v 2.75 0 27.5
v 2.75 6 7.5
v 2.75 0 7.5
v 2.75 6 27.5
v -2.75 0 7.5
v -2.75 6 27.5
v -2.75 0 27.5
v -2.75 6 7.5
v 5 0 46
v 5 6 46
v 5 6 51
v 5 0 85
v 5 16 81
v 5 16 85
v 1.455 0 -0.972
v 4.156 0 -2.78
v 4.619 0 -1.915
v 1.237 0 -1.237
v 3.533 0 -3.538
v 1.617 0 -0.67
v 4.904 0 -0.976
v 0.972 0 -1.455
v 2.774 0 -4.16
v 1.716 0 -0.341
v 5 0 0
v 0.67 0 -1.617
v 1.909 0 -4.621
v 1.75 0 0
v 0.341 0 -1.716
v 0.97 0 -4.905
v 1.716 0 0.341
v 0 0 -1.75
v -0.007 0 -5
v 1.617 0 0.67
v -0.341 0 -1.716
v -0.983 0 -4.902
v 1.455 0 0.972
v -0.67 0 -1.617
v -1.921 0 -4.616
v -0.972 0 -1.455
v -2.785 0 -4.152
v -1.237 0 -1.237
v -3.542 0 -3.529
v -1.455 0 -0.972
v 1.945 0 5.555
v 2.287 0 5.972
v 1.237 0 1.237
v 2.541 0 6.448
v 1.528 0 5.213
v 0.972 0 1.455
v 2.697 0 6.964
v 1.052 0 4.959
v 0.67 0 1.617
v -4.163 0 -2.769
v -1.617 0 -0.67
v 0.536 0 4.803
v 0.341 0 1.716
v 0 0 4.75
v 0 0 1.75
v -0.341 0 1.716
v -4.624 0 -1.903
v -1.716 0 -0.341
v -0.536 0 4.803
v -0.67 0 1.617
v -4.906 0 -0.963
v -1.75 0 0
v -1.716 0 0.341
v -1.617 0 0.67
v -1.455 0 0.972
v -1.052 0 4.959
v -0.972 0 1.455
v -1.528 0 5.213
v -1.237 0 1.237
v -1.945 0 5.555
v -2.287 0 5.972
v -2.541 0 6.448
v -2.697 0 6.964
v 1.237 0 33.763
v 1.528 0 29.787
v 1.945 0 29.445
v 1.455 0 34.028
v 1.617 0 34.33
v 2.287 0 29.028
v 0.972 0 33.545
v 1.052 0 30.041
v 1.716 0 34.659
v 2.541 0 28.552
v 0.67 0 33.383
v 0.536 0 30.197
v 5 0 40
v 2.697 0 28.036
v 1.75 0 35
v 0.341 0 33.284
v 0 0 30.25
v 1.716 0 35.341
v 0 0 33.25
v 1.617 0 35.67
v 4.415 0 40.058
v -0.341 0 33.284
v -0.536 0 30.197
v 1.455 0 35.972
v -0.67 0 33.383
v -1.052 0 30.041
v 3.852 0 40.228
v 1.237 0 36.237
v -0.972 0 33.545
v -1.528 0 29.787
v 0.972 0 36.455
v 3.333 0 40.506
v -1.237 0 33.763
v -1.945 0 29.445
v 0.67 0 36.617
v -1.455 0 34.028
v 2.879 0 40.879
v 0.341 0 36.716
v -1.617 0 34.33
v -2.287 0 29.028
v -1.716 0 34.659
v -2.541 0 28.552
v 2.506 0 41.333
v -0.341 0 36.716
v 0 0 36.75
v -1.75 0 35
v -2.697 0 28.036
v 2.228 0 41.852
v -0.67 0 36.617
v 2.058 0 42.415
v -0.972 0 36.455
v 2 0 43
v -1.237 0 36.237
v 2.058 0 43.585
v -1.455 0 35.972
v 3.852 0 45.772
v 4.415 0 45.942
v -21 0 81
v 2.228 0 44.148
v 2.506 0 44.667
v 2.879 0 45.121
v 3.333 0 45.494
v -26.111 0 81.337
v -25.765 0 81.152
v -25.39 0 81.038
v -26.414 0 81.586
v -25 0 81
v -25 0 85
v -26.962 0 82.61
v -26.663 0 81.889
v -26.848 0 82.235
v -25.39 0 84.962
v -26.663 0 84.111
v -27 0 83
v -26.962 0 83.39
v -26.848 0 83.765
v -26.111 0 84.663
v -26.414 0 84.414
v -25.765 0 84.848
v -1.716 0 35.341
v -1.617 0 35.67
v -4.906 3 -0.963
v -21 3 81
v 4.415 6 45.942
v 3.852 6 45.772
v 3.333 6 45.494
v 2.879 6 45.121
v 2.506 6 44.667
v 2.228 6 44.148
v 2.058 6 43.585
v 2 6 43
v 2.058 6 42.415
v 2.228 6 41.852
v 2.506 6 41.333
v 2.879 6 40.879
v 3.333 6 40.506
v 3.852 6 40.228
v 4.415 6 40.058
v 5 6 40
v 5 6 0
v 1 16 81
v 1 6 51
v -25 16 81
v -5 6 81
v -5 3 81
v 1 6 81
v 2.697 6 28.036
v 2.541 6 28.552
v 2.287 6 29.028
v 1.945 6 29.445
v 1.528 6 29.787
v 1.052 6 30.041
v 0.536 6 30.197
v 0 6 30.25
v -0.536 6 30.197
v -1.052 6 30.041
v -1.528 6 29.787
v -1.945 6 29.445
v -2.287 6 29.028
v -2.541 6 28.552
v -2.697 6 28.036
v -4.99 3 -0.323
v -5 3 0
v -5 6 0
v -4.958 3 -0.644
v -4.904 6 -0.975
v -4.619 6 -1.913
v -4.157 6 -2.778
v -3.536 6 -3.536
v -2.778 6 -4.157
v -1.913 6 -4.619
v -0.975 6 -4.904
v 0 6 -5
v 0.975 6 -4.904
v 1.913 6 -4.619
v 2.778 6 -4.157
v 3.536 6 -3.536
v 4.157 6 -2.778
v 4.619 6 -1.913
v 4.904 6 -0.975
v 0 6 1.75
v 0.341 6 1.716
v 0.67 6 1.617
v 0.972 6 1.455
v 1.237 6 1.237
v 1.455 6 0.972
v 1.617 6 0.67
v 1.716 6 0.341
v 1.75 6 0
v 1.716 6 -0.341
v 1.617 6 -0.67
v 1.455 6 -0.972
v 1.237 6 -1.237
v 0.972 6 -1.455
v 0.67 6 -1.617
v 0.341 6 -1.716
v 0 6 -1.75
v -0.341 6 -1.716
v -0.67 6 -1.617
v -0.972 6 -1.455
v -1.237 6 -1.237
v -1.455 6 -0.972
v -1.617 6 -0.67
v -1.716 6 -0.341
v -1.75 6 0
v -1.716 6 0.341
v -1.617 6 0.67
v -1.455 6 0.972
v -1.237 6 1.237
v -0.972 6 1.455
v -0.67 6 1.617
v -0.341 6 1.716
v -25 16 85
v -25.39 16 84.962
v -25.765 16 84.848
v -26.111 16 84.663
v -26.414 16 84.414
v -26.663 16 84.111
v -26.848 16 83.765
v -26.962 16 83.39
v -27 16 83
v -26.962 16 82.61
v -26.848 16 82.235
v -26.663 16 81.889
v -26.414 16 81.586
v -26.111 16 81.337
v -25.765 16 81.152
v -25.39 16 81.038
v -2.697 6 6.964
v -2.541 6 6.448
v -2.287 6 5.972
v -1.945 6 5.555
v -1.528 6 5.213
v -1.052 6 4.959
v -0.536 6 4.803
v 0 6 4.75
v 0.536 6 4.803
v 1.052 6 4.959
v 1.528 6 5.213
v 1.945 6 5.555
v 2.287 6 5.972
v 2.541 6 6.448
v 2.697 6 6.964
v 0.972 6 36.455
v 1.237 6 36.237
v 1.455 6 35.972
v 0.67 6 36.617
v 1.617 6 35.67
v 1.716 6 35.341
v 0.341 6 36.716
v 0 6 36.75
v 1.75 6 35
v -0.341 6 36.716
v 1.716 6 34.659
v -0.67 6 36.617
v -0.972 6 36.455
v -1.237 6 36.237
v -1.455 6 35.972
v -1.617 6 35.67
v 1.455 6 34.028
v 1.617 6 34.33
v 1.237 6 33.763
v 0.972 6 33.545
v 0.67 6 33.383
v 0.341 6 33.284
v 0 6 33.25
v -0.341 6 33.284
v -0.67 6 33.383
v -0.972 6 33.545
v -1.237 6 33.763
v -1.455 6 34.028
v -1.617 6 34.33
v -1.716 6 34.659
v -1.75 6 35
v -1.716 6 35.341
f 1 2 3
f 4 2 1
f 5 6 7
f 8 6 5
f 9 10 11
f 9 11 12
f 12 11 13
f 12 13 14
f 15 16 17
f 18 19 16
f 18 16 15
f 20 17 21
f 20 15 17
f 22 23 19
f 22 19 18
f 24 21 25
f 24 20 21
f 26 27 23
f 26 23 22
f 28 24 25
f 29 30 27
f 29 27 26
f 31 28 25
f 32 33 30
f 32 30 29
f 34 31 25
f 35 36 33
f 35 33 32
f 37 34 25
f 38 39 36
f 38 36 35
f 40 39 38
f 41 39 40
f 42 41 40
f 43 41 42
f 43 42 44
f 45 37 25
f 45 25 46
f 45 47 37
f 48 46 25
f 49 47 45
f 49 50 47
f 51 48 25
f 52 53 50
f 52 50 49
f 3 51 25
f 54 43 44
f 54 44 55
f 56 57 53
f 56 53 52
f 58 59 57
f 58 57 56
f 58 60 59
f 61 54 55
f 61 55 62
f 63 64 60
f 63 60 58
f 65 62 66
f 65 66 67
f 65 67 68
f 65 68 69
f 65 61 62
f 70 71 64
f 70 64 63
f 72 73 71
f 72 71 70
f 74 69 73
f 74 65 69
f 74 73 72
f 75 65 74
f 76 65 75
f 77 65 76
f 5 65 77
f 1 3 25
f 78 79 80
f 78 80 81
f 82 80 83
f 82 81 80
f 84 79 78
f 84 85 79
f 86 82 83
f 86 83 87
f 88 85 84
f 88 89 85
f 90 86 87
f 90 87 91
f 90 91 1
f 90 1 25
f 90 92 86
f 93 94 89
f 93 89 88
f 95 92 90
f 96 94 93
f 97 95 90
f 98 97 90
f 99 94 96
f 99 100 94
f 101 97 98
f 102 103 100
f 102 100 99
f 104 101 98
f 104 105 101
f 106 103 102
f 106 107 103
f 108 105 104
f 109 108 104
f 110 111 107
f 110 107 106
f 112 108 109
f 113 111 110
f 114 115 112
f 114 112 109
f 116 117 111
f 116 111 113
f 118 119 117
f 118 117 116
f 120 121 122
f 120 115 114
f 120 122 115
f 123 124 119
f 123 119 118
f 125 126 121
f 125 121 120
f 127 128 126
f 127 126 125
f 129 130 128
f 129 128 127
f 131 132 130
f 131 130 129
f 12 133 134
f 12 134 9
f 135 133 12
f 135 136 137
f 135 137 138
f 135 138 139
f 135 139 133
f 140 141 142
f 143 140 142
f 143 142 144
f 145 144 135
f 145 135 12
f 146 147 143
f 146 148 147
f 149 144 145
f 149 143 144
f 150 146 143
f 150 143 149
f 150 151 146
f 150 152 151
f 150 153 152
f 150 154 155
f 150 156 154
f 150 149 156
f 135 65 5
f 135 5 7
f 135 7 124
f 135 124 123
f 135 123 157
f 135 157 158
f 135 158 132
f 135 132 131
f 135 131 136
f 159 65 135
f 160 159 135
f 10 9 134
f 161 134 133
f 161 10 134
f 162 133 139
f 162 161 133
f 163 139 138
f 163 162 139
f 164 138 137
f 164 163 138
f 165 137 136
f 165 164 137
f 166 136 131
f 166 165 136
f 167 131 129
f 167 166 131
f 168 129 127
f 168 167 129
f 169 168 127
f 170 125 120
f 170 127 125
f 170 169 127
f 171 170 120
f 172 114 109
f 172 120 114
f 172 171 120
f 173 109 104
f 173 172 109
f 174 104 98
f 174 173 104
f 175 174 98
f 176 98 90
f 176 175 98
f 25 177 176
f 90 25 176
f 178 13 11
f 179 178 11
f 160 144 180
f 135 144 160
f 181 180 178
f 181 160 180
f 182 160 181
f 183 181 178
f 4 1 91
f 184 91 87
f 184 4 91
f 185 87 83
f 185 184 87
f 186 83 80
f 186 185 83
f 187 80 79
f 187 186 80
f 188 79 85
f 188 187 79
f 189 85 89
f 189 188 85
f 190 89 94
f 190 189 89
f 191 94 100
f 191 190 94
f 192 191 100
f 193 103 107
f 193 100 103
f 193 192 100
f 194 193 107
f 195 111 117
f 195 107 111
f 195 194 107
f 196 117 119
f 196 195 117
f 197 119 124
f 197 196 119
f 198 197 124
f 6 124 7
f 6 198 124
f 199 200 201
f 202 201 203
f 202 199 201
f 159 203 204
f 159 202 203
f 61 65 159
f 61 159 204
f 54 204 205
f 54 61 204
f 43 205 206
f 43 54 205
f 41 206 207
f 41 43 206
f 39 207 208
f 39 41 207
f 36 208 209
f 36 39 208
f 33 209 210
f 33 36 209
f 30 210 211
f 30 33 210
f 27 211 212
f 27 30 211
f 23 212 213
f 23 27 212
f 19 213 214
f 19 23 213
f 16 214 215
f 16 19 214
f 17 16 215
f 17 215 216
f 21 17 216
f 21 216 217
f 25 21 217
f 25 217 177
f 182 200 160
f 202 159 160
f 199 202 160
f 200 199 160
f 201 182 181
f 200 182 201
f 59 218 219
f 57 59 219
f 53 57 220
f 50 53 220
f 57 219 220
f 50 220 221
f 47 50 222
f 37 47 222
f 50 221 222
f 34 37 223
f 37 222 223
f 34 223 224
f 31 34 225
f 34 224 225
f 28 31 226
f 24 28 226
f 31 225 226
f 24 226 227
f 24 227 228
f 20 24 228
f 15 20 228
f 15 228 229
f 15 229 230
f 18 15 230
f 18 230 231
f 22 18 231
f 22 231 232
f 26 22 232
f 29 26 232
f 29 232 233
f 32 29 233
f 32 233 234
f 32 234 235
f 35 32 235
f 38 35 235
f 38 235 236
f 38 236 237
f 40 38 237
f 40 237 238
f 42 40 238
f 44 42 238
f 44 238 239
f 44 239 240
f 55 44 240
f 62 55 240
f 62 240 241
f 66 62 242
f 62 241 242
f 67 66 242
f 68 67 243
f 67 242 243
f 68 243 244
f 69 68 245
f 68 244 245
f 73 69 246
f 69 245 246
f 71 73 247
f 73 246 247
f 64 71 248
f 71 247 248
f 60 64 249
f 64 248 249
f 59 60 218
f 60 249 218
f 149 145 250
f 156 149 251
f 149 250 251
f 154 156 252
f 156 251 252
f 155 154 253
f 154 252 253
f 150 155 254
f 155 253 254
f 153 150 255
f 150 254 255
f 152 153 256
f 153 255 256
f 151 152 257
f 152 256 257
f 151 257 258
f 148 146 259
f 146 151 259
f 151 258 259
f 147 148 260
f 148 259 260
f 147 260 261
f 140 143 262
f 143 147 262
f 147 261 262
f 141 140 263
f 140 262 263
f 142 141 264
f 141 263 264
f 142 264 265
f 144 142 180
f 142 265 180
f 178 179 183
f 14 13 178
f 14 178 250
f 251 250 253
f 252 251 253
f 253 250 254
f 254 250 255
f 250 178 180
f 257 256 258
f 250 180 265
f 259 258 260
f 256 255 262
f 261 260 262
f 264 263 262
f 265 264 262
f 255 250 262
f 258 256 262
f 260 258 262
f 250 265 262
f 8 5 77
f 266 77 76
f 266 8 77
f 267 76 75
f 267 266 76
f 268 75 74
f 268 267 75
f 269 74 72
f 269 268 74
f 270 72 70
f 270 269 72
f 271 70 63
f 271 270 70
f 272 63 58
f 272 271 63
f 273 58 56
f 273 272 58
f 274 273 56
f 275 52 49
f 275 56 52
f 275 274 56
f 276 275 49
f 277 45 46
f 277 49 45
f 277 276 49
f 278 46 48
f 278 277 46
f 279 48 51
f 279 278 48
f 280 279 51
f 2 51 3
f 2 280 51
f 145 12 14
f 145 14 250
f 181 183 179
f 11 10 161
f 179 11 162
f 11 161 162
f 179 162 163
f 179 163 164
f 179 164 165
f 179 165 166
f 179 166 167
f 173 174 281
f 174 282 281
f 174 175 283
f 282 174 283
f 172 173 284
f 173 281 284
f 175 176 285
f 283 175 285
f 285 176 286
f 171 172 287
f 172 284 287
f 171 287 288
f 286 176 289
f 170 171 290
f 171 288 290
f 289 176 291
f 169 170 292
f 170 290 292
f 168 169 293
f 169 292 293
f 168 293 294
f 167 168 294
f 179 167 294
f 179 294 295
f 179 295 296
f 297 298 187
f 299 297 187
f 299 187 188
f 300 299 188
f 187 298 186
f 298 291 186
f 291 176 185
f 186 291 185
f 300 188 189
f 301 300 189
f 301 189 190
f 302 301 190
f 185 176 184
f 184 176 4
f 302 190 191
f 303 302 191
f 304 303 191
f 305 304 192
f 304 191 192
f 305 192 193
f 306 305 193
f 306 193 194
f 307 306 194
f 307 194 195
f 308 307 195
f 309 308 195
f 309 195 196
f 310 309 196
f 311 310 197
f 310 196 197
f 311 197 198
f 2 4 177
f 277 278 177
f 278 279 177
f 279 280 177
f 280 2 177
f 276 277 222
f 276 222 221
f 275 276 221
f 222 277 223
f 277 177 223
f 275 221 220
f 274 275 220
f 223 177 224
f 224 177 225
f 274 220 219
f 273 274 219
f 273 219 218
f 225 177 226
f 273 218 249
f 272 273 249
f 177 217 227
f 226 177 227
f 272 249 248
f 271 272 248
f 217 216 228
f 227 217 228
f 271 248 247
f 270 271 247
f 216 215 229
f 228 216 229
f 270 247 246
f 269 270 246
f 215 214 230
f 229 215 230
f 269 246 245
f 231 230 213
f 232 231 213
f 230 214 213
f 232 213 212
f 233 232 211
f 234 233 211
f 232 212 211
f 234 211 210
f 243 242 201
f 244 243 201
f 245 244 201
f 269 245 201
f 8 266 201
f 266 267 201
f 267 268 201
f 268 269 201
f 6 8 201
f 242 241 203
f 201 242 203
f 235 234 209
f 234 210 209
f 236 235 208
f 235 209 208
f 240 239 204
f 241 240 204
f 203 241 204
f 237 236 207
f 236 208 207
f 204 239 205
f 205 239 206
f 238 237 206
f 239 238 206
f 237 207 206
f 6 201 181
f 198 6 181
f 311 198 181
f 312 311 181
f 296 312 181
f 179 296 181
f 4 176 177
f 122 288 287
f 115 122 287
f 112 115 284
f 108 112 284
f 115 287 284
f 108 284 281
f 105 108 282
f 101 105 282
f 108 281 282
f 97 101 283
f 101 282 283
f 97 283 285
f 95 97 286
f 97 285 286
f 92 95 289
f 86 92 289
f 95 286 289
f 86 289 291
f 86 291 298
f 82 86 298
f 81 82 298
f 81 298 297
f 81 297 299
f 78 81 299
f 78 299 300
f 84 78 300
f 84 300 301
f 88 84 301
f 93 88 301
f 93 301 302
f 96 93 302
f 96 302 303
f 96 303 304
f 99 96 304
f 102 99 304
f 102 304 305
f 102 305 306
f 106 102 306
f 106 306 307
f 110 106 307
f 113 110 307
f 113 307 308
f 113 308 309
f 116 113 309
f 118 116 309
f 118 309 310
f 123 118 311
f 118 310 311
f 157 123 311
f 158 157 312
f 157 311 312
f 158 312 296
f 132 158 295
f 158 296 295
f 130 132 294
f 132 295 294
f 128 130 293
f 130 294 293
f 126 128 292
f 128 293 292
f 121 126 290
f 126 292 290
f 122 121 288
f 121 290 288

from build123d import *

# Parameters (mm, degrees)
BOSS_EXTRUDE1_DEPTH             = 6
BOSS_EXTRUDE2_DEPTH             = 10
BOSS_EXTRUDE2_DIRECTION_2_REACH = 87.358
RIB1_REACH                      = 92.609
SKETCH3_WALL_W                  = 266.260300784
SKETCH3_WALL_H                  = 3
CUT_EXTRUDE1_REACH              = 91.744
SKETCH4_R                       = 1.75
BOSS_EXTRUDE3_DEPTH             = 4
CUT_EXTRUDE2_REACH              = 91.744


with BuildPart() as part:
    # Sketch1 → Boss-Extrude1 (new body)
    with BuildSketch(Plane(origin=(0, 0, 0), x_dir=(1, 0, 0), z_dir=(0, 1, 0))):
        with BuildLine():
            Line((5, 0), (5, -85))
            Line((5, -85), (-5, -85))
            Line((-5, -85), (-5, 0))
            ThreePointArc((-5, 0), (0, 5), (5, 0))
        make_face()
    extrude(amount=BOSS_EXTRUDE1_DEPTH)

    # Sketch2 → Boss-Extrude2 (add)
    with BuildSketch(Plane(origin=(0, 6, 0), x_dir=(1, 0, 0), z_dir=(0, 1, 0))):
        with BuildLine():
            Line((5, -81), (5, -85))
            Line((5, -85), (-25, -85))
            ThreePointArc((-25, -85), (-27, -83), (-25, -81))
            Line((-25, -81), (5, -81))
        make_face()
    extrude(amount=BOSS_EXTRUDE2_DEPTH)

    # Boss-Extrude2 direction 2: up to this face of the body (flat: up to its plane)
    boss_extrude2_direction_2_end = Plane(part.part.faces().sort_by_distance((0, 0, 40.529502163))[0])
    # Sketch2 → Boss-Extrude2 direction 2 (add, up to the picked face)
    with BuildSketch(Plane(origin=(0, 6, 0), x_dir=(1, 0, 0), z_dir=(0, 1, 0)), mode=Mode.PRIVATE) as boss_extrude2_direction_2_sk1:
        with BuildLine():
            Line((5, -81), (5, -85))
            Line((5, -85), (-25, -85))
            ThreePointArc((-25, -85), (-27, -83), (-25, -81))
            Line((-25, -81), (5, -81))
        make_face()
    boss_extrude2_direction_2_tool1 = split(extrude(boss_extrude2_direction_2_sk1.sketch, amount=-BOSS_EXTRUDE2_DIRECTION_2_REACH, mode=Mode.PRIVATE), bisect_by=boss_extrude2_direction_2_end, keep=Keep.BOTH, mode=Mode.PRIVATE)
    add(boss_extrude2_direction_2_tool1.solids().sort_by(Axis((-10.788554, 6, 83), (0, -1, 0)))[0])

    # Sketch3 wall → Rib1 (add, up to next)
    with BuildSketch(Plane(origin=(-13, 0, 40.256880935), x_dir=(-0.192673122493, 0, 0.98126299628), z_dir=(0.98126299628, 0, 0.192673122493)), mode=Mode.PRIVATE) as rib1_sk1:
        with Locations((0, -1.5)):
            Rectangle(SKETCH3_WALL_W, SKETCH3_WALL_H)
    rib1_tool1 = extrude(rib1_sk1.sketch, amount=RIB1_REACH, mode=Mode.PRIVATE) - part.part
    add(rib1_tool1.solids().sort_by_distance((-13, 0, 40.256880935))[0])

    # Sketch4 → Cut-Extrude1 (cut, up to next)
    with BuildSketch(Plane(origin=(0, 6, 0), x_dir=(1, 0, 0), z_dir=(0, 1, 0)), mode=Mode.PRIVATE) as cut_extrude1_sk1:
        with Locations(Location((0, 0, 0), (0, 0, 270))):
            Circle(SKETCH4_R)
    cut_extrude1_tool1 = extrude(cut_extrude1_sk1.sketch, amount=-CUT_EXTRUDE1_REACH, mode=Mode.PRIVATE) & part.part
    # Sketch4 → Cut-Extrude1 (cut, up to next)
    with BuildSketch(Plane(origin=(0, 6, 0), x_dir=(1, 0, 0), z_dir=(0, 1, 0)), mode=Mode.PRIVATE) as cut_extrude1_sk2:
        with Locations(Location((0, -35, 0), (0, 0, 270))):
            Circle(SKETCH4_R)
    cut_extrude1_tool2 = extrude(cut_extrude1_sk2.sketch, amount=-CUT_EXTRUDE1_REACH, mode=Mode.PRIVATE) & part.part
    # Sketch4 → Cut-Extrude1 (cut, up to next)
    with BuildSketch(Plane(origin=(0, 6, 0), x_dir=(1, 0, 0), z_dir=(0, 1, 0)), mode=Mode.PRIVATE) as cut_extrude1_sk3:
        with BuildLine():
            Line((2.75, -7.5), (2.75, -27.5))
            ThreePointArc((2.75, -27.5), (0, -30.25), (-2.75, -27.5))
            Line((-2.75, -27.5), (-2.75, -7.5))
            ThreePointArc((-2.75, -7.5), (0, -4.75), (2.75, -7.5))
        make_face()
    cut_extrude1_tool3 = extrude(cut_extrude1_sk3.sketch, amount=-CUT_EXTRUDE1_REACH, mode=Mode.PRIVATE) & part.part
    add(cut_extrude1_tool1.solids().sort_by_distance((0, 6, 0))[0], mode=Mode.SUBTRACT)
    add(cut_extrude1_tool2.solids().sort_by_distance((0, 6, 35))[0], mode=Mode.SUBTRACT)
    add(cut_extrude1_tool3.solids().sort_by_distance((0, 6, 17.5))[0], mode=Mode.SUBTRACT)

    # Sketch5 → Boss-Extrude3 (add)
    with BuildSketch(Plane(origin=(5, 0, 0), x_dir=(0, 0, -1), z_dir=(1, 0, 0))):
        Polygon((-81, 16), (-51, 6), (-81, 6), align=None)
    extrude(amount=-BOSS_EXTRUDE3_DEPTH)

    # Sketch6 → Cut-Extrude2 (cut, up to next)
    with BuildSketch(Plane(origin=(0, 6, 0), x_dir=(1, 0, 0), z_dir=(0, 1, 0)), mode=Mode.PRIVATE) as cut_extrude2_sk1:
        with BuildLine():
            Line((5, -40), (5, -46))
            ThreePointArc((5, -46), (2, -43), (5, -40))
        make_face()
    cut_extrude2_tool1 = extrude(cut_extrude2_sk1.sketch, amount=-CUT_EXTRUDE2_REACH, mode=Mode.PRIVATE) & part.part
    add(cut_extrude2_tool1.solids().sort_by_distance((3.72676, 6, 43))[0], mode=Mode.SUBTRACT)


solid = part.part
